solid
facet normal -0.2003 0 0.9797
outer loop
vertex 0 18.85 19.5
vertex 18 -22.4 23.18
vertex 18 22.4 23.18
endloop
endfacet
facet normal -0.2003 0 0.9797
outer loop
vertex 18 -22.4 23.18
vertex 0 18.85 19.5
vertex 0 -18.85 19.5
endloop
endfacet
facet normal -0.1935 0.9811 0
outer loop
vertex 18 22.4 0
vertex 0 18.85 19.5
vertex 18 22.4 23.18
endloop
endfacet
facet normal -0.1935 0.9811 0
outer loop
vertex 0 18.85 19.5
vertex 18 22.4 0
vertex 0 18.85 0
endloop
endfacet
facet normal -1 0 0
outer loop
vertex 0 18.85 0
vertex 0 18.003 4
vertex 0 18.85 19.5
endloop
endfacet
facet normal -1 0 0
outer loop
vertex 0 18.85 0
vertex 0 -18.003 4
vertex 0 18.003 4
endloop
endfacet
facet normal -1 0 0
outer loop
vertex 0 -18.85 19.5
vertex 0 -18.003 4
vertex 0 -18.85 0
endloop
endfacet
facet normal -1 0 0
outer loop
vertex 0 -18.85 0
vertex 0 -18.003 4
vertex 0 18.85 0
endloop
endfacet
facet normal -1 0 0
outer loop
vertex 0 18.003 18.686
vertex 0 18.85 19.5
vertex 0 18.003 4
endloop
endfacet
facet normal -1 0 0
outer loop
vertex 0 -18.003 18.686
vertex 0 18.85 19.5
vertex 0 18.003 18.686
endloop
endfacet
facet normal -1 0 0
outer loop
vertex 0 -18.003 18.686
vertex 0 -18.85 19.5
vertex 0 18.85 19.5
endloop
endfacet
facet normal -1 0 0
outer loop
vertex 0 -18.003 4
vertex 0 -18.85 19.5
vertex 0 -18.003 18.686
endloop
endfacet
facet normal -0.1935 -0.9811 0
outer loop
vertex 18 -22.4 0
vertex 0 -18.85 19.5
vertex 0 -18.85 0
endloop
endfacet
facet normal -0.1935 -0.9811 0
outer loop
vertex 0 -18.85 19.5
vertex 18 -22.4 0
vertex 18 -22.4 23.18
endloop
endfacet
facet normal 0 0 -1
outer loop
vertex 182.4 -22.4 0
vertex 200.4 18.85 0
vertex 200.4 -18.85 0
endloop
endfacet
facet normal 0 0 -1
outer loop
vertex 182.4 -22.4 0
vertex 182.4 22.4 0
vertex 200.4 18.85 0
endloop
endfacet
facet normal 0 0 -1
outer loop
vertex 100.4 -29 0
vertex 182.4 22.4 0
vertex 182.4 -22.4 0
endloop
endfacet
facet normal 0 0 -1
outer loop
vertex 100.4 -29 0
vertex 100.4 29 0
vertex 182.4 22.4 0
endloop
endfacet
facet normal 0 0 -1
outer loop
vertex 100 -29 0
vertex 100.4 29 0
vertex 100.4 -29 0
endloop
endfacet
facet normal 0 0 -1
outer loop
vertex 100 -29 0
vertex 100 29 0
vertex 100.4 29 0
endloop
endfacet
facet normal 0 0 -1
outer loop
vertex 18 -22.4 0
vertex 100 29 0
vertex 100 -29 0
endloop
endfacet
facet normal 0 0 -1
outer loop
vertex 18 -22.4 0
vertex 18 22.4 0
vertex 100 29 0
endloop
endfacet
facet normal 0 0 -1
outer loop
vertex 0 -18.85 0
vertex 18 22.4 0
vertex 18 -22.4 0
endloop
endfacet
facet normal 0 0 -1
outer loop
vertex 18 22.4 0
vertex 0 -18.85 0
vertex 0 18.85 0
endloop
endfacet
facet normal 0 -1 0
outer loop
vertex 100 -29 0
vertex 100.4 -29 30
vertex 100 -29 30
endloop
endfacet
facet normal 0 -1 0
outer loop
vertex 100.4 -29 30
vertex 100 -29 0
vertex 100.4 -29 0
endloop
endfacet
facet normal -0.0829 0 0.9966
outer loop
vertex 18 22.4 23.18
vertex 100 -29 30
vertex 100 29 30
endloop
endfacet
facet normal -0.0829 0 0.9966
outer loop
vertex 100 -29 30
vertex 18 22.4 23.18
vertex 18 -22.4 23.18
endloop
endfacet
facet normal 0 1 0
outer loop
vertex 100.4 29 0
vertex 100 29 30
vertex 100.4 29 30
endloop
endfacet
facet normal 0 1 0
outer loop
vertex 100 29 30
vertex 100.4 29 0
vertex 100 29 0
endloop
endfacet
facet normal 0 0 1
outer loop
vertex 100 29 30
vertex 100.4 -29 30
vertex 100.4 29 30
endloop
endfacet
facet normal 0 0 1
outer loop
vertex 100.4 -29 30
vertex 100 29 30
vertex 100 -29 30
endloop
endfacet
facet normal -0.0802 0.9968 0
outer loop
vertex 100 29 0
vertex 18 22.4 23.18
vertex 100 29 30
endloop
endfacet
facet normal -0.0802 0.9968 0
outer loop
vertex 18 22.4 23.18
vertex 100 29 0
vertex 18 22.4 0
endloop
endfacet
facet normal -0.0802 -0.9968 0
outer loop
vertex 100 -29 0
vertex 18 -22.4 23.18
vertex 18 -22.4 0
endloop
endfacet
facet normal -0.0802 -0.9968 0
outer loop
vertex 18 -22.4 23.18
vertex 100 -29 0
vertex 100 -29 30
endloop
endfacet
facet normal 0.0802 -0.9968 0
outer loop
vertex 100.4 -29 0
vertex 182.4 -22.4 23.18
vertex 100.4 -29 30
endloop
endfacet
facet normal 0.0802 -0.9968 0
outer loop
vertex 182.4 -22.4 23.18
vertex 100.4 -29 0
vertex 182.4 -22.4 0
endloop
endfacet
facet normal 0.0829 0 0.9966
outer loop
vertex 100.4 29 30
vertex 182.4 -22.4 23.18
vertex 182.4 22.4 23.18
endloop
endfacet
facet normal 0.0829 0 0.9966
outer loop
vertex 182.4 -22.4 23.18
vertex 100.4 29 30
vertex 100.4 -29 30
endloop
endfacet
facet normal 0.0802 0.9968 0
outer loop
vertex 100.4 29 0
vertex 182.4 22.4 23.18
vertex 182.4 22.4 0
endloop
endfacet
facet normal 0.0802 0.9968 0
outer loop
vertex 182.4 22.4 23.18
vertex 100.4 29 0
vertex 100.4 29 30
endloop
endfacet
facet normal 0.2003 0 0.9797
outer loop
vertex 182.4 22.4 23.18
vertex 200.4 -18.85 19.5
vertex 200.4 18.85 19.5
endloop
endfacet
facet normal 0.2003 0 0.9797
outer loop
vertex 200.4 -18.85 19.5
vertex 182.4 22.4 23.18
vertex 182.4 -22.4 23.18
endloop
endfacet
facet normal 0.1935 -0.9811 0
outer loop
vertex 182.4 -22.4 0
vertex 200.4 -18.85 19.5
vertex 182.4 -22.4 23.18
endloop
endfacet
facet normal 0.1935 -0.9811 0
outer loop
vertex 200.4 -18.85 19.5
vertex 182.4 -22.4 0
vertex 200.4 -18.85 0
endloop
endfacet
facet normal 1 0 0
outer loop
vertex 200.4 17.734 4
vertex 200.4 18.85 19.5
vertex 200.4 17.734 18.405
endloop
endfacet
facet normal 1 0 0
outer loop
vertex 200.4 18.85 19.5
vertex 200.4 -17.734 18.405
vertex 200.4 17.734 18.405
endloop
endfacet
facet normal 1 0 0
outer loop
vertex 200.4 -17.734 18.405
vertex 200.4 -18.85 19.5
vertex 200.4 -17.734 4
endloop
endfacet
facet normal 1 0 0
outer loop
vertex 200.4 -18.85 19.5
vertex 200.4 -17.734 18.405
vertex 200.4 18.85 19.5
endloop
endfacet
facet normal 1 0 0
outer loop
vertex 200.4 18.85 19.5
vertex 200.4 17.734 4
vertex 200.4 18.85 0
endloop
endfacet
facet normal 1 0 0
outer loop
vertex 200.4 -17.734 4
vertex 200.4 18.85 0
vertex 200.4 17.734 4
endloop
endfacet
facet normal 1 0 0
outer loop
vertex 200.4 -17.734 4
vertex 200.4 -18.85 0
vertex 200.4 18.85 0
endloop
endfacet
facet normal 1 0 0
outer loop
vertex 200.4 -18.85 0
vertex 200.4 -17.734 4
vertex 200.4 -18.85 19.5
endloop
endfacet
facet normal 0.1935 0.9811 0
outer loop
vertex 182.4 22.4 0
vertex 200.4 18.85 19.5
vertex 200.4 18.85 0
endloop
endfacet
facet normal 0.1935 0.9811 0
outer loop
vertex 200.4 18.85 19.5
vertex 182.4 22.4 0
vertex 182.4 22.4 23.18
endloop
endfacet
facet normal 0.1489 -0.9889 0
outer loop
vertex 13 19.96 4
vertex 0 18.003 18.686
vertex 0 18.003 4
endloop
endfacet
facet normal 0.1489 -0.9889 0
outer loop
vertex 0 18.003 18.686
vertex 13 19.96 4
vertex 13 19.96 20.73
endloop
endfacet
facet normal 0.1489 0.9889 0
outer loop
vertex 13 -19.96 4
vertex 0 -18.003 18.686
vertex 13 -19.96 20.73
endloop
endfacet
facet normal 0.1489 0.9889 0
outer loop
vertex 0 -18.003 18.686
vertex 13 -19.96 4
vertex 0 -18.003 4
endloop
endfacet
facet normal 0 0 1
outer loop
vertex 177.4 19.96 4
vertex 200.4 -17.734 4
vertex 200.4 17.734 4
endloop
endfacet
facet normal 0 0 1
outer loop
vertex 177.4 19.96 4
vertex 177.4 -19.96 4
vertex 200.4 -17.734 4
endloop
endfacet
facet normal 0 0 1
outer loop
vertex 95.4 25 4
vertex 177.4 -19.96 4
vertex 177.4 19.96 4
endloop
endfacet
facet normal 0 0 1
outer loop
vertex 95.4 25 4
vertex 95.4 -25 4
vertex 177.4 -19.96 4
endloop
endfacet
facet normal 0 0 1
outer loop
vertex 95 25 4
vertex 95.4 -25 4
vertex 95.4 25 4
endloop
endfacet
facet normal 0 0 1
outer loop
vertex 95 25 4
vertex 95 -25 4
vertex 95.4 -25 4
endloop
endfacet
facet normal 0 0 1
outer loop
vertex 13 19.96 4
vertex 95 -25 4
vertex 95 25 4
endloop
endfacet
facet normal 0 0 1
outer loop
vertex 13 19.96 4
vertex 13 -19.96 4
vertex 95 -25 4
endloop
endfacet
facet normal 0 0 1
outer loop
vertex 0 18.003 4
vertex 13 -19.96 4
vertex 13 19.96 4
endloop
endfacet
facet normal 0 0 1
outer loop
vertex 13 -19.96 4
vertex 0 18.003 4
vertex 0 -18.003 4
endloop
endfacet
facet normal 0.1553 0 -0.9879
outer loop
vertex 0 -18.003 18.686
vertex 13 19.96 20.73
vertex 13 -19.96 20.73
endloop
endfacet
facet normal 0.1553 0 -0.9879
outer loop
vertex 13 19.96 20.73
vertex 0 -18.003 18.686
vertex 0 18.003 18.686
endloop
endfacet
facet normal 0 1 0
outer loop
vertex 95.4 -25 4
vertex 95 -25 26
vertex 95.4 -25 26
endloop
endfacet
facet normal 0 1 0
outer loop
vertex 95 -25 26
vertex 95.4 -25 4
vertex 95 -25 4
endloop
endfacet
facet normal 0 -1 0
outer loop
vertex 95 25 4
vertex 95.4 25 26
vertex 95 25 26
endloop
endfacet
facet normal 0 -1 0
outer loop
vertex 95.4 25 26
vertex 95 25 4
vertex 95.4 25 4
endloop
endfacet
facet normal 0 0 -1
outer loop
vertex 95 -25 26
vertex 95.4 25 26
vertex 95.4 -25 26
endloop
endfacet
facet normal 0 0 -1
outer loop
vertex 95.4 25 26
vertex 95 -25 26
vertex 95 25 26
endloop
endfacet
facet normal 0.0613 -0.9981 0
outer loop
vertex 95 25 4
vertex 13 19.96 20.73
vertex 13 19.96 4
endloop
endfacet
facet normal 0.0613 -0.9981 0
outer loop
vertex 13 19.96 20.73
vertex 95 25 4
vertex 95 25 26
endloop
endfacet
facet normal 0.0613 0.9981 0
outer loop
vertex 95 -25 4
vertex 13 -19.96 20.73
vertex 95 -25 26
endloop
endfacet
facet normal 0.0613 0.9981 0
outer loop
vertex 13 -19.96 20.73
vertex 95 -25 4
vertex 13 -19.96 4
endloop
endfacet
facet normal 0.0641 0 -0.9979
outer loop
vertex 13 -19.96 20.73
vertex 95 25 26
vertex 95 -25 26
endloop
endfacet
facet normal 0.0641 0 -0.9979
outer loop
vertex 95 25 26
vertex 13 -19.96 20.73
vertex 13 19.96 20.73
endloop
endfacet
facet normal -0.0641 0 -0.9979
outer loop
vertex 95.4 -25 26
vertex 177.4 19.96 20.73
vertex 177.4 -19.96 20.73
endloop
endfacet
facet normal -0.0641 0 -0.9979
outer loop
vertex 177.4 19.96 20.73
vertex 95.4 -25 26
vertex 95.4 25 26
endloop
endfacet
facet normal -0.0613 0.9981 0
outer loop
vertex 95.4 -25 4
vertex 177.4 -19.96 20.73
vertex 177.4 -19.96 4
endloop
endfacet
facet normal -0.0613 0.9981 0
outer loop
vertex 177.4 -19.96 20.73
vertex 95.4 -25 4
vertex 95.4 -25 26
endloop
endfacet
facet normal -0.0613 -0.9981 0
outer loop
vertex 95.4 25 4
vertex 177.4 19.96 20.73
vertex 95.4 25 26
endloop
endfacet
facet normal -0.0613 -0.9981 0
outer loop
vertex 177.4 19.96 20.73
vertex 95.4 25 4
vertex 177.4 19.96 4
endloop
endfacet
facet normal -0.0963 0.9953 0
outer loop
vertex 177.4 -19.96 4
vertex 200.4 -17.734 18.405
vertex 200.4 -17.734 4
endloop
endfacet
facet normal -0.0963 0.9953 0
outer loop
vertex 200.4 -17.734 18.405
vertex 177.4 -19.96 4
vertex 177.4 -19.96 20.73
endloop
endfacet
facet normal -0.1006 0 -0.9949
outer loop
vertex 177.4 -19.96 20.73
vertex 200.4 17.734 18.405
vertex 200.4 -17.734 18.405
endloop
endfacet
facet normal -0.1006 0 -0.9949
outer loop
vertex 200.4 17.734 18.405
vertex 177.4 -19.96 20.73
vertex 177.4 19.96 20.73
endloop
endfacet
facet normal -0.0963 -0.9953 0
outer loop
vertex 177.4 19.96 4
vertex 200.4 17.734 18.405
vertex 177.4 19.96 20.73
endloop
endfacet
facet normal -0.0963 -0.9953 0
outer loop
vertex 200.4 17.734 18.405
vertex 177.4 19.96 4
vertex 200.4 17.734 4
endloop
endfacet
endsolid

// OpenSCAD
$fn = 32;

// ----------------------------------------------------------------------
// Faired channel: 200 x 58 x 30 mm, 4 mm walls, faired ends
// ----------------------------------------------------------------------

// --- parameters (mm) ---
length = 200;             // channel length
width = 58;               // channel width at mid length
height = 30;              // channel height at mid length
wall = 4;                 // side wall thickness
floor_t = 4;              // floor thickness
end_w = 37.7;             // faired end width
end_h = 19.5;             // faired end height

difference() {
  union() {
    hull() {
      translate([0, -18.85, 0]) cube([0.4, 37.7, 19.5]);
      translate([18, -22.4, 0]) cube([0.4, 44.8, 23.18]);
    }
    hull() {
      translate([18, -22.4, 0]) cube([0.4, 44.8, 23.18]);
      translate([100, -29, 0]) cube([0.4, 58, 30]);
    }
    hull() {
      translate([100, -29, 0]) cube([0.4, 58, 30]);
      translate([182, -22.4, 0]) cube([0.4, 44.8, 23.18]);
    }
    hull() {
      translate([182, -22.4, 0]) cube([0.4, 44.8, 23.18]);
      translate([200, -18.85, 0]) cube([0.4, 37.7, 19.5]);
    }
  }
  /* cavity, 5 mm proud of both ends so the ports are cut clean */
  hull() {
    translate([-5, -17.25, 4]) cube([0.4, 34.5, 13.9]);
    translate([13, -19.96, 4]) cube([0.4, 39.92, 16.73]);
  }
  hull() {
    translate([13, -19.96, 4]) cube([0.4, 39.92, 16.73]);
    translate([95, -25, 4]) cube([0.4, 50, 22]);
  }
  hull() {
    translate([95, -25, 4]) cube([0.4, 50, 22]);
    translate([177, -19.96, 4]) cube([0.4, 39.92, 16.73]);
  }
  hull() {
    translate([177, -19.96, 4]) cube([0.4, 39.92, 16.73]);
    translate([205, -17.25, 4]) cube([0.4, 34.5, 13.9]);
  }
}
